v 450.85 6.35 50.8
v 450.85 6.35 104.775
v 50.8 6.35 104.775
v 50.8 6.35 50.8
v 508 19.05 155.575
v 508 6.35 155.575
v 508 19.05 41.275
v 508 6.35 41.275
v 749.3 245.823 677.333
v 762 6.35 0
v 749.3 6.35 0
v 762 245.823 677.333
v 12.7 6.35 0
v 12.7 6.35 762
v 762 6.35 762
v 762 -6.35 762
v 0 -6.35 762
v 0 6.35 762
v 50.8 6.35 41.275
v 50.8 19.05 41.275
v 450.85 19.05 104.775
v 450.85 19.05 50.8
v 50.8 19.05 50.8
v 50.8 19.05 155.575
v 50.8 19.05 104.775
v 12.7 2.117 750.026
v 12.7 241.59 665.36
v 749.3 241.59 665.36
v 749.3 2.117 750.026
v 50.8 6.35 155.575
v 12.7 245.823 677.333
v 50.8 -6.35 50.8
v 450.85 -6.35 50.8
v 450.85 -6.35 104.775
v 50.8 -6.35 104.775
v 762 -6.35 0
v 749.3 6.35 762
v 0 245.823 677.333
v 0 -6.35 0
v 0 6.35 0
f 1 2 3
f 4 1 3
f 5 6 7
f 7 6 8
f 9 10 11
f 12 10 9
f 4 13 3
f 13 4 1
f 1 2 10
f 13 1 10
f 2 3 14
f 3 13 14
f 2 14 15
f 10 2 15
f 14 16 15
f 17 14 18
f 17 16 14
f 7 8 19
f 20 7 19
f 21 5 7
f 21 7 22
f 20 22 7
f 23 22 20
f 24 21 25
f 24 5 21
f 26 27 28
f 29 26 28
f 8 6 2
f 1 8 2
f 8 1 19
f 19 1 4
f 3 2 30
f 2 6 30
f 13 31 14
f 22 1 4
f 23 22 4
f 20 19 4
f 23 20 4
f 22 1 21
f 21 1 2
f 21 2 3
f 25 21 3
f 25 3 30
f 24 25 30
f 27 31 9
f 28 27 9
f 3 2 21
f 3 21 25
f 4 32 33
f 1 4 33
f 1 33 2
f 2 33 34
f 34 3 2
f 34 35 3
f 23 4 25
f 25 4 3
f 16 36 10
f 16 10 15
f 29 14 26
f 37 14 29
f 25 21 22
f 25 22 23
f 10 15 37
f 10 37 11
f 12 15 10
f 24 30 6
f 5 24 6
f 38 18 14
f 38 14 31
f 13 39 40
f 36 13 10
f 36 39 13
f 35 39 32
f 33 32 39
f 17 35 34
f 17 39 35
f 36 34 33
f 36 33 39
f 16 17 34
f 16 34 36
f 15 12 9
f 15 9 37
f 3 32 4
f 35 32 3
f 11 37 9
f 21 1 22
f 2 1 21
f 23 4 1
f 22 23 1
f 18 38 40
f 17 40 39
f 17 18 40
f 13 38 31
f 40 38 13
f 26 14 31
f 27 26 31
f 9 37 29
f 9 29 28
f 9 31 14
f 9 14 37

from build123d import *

# Parameters (mm, degrees)
F0_W      = 400.05
F0_H      = 53.975
F1_DEPTH  = 6.35
F3_DEPTH  = 6.35
F4_W      = 400.05
F4_H      = 53.975
F5_DEPTH  = 12.7
F6_DEPTH  = 12.7
F8_DEPTH  = 12.7
F10_DEPTH = 12.7
F11_W     = 736.6
F11_H     = 254
F12_DEPTH = 12.7


with BuildPart() as f1:
    # F0 (on Front) → F1 (new body)
    with BuildSketch(Plane.XZ):
        Polygon((0, 762), (0, 0), (50.8, 0), (762, 0), (762, 762), align=None)
        with Locations((250.825, 77.7875)):
            Rectangle(F0_W, F0_H, mode=Mode.SUBTRACT)
    extrude(amount=F1_DEPTH)

    # F3 (add): a face of the model
    f3_faces = [f1.faces().sort_by_distance(p)[0] for p in [
        (386.0278562155, 0, 392.711226063),
    ]]
    extrude(f3_faces, amount=F3_DEPTH)

    # F9 (on face) → F10 (join)
    with BuildSketch(Plane(origin=(0, 0, 0), x_dir=(0, -1, 0), z_dir=(-1, 0, 0))):
        Polygon((-6.35, 0), (-6.35, 762), (-245.8234965618, 677.3333333333), align=None)
    extrude(amount=-F10_DEPTH)


with BuildPart() as f5:
    # F4 (on face) → F5 (new body)
    with BuildSketch(Plane(origin=(0, 6.35, 0), x_dir=(-1, 0, 0), z_dir=(0, 1, 0))):
        with Locations((-250.825, 77.7875)):
            Rectangle(F4_W, F4_H)
    extrude(amount=F5_DEPTH)


with BuildPart() as f6:
    # F4 (on face) → F6 (new body)
    with BuildSketch(Plane(origin=(0, 6.35, 0), x_dir=(-1, 0, 0), z_dir=(0, 1, 0))):
        Polygon((-450.85, 104.775), (-50.8, 104.775), (-50.8, 155.575), (-508, 155.575), (-508, 41.275), (-50.8, 41.275), (-50.8, 50.8), (-450.85, 50.8), align=None)
    extrude(amount=F6_DEPTH)


with BuildPart() as f8:
    # F7 (on face) → F8 (new body)
    with BuildSketch(Plane.YZ.offset(762)):
        Polygon((245.8234965618, 677.3333333333), (6.35, 762), (6.35, 0), align=None)
    extrude(amount=-F8_DEPTH)


with BuildPart() as f12:
    # F11 (on face) → F12 (new body)
    with BuildSketch(Plane(origin=(0, 240.1790521174, 679.3289458047), x_dir=(1, 0, 0), z_dir=(0, 0.3333333333, 0.9428090416))):
        with Locations((381, -121.013162586)):
            Rectangle(F11_W, F11_H)
    extrude(amount=-F12_DEPTH)


solid = Compound([f1.part, f5.part, f6.part, f8.part, f12.part])
